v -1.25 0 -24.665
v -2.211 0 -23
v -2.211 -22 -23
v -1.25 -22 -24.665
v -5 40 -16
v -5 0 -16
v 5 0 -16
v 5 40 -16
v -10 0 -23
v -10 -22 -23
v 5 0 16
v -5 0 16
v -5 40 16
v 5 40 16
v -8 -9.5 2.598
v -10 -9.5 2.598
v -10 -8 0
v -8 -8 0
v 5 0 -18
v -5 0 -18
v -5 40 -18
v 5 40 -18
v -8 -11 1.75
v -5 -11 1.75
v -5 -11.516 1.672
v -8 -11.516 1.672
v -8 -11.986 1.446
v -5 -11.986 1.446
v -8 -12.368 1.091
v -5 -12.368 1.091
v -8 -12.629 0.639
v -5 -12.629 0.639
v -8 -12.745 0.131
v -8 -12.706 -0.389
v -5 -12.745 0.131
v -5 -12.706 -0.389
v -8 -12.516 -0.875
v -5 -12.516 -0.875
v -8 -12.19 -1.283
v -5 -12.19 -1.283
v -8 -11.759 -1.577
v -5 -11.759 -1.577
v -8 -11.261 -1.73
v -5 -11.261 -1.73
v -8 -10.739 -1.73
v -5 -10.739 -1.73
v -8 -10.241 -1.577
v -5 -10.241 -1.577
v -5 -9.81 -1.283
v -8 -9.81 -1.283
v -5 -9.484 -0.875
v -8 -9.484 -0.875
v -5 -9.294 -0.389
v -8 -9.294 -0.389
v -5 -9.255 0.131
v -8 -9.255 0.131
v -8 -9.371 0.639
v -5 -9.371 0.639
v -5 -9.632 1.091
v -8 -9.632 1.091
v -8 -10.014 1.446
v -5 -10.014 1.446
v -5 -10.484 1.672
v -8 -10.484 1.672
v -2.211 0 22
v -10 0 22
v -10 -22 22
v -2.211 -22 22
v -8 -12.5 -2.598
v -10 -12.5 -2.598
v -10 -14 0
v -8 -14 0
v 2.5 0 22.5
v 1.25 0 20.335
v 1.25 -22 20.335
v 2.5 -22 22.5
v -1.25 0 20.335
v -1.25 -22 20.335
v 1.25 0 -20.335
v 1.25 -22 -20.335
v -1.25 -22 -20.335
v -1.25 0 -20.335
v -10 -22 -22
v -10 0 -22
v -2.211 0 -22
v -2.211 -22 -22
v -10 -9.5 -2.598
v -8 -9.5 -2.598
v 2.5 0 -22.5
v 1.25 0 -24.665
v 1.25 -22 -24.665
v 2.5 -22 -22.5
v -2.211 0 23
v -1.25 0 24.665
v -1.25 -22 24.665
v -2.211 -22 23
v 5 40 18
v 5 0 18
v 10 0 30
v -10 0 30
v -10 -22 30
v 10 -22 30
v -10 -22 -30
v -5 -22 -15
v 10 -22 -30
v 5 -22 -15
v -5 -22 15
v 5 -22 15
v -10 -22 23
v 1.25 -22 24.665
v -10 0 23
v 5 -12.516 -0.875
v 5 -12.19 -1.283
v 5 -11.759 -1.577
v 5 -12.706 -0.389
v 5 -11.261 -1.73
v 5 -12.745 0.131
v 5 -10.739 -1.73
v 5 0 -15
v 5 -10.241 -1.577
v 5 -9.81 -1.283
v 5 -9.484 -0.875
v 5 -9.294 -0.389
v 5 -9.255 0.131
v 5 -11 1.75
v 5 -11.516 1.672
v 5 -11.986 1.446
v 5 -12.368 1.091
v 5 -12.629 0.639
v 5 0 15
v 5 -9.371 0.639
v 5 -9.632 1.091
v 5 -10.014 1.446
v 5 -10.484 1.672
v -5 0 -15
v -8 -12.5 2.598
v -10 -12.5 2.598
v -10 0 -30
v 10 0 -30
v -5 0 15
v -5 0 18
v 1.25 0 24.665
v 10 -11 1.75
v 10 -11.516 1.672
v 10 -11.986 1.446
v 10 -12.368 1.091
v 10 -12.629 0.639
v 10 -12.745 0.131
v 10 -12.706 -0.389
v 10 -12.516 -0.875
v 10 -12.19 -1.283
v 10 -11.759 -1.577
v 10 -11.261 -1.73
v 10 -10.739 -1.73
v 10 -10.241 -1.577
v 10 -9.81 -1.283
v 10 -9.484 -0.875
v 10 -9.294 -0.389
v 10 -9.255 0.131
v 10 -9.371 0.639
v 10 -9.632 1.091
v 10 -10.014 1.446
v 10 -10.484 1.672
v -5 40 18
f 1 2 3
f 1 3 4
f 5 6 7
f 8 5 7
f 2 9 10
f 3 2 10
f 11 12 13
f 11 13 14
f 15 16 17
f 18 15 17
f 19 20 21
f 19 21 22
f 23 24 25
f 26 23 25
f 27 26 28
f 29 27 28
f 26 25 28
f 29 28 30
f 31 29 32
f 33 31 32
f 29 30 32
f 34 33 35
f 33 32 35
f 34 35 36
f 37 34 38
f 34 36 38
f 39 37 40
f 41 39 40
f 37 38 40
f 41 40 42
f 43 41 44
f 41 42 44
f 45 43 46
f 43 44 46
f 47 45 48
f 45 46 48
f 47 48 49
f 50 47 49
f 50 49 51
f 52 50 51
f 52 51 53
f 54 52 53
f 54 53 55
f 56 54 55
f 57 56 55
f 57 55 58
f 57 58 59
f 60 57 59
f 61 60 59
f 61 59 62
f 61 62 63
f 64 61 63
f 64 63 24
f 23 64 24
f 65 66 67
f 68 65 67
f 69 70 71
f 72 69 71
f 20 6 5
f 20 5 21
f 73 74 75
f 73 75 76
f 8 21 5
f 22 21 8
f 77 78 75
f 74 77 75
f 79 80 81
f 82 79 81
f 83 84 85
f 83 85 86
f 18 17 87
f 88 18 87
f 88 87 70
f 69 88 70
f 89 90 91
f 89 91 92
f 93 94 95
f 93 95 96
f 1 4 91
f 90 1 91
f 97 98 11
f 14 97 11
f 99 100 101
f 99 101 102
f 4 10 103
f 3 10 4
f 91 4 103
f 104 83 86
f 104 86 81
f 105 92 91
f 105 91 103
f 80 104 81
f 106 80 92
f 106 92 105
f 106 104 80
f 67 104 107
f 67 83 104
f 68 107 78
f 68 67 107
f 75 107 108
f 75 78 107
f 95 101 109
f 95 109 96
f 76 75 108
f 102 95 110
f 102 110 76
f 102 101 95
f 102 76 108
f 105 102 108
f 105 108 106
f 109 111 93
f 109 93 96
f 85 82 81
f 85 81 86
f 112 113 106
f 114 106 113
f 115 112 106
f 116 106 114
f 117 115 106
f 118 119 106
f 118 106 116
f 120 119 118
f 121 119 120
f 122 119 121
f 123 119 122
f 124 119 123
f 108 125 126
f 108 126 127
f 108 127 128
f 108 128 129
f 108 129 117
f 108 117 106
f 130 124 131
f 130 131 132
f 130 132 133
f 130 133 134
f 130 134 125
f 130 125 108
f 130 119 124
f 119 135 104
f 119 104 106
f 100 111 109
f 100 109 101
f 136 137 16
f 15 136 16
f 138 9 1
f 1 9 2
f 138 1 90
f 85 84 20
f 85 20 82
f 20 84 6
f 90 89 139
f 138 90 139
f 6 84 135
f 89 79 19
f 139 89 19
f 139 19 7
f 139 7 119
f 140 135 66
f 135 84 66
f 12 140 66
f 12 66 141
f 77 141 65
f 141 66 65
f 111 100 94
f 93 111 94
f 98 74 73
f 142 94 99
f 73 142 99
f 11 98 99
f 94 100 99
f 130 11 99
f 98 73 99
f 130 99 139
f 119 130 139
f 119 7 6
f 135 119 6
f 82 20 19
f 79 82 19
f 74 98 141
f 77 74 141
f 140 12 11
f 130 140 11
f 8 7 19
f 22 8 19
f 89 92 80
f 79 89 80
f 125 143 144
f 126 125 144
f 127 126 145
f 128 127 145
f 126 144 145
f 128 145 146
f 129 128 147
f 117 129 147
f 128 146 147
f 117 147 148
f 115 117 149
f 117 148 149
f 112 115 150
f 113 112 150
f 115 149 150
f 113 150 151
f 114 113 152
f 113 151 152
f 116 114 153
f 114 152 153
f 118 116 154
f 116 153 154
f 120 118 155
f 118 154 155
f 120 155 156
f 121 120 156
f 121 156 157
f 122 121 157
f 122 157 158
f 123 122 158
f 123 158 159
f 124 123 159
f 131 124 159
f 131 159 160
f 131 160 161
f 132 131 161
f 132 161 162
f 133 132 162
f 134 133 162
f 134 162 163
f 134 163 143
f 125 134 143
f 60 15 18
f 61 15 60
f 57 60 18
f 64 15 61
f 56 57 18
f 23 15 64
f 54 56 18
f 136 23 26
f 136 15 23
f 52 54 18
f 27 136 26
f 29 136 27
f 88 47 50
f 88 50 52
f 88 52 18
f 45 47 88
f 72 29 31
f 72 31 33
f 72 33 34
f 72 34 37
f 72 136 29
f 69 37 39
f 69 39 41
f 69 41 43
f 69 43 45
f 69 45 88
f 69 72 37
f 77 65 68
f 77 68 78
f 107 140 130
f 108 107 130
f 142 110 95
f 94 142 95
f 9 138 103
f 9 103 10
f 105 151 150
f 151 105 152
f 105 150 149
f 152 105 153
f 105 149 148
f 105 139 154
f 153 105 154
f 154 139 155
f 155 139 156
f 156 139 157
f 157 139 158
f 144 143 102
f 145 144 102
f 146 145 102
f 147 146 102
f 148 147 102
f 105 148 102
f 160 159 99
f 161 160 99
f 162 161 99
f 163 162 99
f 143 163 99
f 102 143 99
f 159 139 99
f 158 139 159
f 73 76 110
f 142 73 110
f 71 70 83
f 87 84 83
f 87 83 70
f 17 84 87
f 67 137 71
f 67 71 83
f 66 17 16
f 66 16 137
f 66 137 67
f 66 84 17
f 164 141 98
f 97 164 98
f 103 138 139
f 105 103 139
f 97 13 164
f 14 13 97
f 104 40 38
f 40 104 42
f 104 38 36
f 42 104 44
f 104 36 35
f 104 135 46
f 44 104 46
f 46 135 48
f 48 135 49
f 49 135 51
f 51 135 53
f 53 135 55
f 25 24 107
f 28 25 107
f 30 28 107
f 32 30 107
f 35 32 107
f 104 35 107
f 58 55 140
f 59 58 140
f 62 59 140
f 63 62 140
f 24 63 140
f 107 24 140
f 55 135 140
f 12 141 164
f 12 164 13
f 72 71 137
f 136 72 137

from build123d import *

# Parameters (mm, degrees)
SKETCH055_W     = 20
SKETCH055_H     = 60
SKETCH055_W_2   = 10
SKETCH055_H_2   = 30
PAD031_DEPTH    = 22
SKETCH056_R     = 1.75
POCKET028_DEPTH = 20.001
POCKET029_DEPTH = 2
SKETCH058_W     = 1
SKETCH058_H     = 22
POCKET030_DEPTH = 11
SKETCH059_W     = 10
SKETCH059_H     = 2
PAD032_DEPTH    = 40


with BuildPart() as part:
    # Sketch055 → Pad031 (new body)
    with BuildSketch(Plane.XZ):
        Rectangle(SKETCH055_W, SKETCH055_H)
        Polygon((1.25, 20.3349364905), (2.5, 22.5), (1.25, 24.6650635095), (-1.25, 24.6650635095), (-2.5, 22.5), (-1.25, 20.3349364905), align=None, mode=Mode.SUBTRACT)
        Polygon((2.5, -22.5), (1.25, -20.3349364905), (-1.25, -20.3349364905), (-2.5, -22.5), (-1.25, -24.6650635095), (1.25, -24.6650635095), align=None, mode=Mode.SUBTRACT)
        Rectangle(SKETCH055_W_2, SKETCH055_H_2, mode=Mode.SUBTRACT)
    extrude(amount=PAD031_DEPTH)

    # Sketch056 (on Face2 of Pad031) → Pocket028 (cut, through all)
    with BuildSketch(Plane(origin=(10, 0, 0), x_dir=(0, 0, 1), z_dir=(1, 0, 0))):
        with Locations((0, 11)):
            Circle(SKETCH056_R)
    extrude(amount=-POCKET028_DEPTH, mode=Mode.SUBTRACT)

    # Sketch057 (on Face2 of Pocket028) → Pocket029 (cut)
    with BuildSketch(Plane(origin=(-10, 0, 0), x_dir=(0, 0, -1), z_dir=(-1, 0, 0))):
        Polygon((2.5980762114, 9.5), (2.5980762114, 12.5), (0, 14), (-2.5980762114, 12.5), (-2.5980762114, 9.5), (0, 8), align=None)
    extrude(amount=-POCKET029_DEPTH, mode=Mode.SUBTRACT)

    # Sketch058 (on Face2 of Pocket029) → Pocket030 (cut)
    with BuildSketch(Plane(origin=(-10, 0, 0), x_dir=(0, 0, -1), z_dir=(-1, 0, 0))):
        with Locations((22.5, 11)):
            Rectangle(SKETCH058_W, SKETCH058_H)
        with Locations((-22.5, 11)):
            Rectangle(SKETCH058_W, SKETCH058_H)
    extrude(amount=-POCKET030_DEPTH, mode=Mode.SUBTRACT)

    # Sketch059 (on Face4 of Pocket030) → Pad032 (join)
    with BuildSketch(Plane(origin=(0, 0, 0), x_dir=(1, 0, 0), z_dir=(0, 1, 0))):
        with Locations((0, 17)):
            Rectangle(SKETCH059_W, SKETCH059_H)
        with Locations((0, -17)):
            Rectangle(SKETCH059_W, SKETCH059_H)
    extrude(amount=PAD032_DEPTH)


solid = part.part
